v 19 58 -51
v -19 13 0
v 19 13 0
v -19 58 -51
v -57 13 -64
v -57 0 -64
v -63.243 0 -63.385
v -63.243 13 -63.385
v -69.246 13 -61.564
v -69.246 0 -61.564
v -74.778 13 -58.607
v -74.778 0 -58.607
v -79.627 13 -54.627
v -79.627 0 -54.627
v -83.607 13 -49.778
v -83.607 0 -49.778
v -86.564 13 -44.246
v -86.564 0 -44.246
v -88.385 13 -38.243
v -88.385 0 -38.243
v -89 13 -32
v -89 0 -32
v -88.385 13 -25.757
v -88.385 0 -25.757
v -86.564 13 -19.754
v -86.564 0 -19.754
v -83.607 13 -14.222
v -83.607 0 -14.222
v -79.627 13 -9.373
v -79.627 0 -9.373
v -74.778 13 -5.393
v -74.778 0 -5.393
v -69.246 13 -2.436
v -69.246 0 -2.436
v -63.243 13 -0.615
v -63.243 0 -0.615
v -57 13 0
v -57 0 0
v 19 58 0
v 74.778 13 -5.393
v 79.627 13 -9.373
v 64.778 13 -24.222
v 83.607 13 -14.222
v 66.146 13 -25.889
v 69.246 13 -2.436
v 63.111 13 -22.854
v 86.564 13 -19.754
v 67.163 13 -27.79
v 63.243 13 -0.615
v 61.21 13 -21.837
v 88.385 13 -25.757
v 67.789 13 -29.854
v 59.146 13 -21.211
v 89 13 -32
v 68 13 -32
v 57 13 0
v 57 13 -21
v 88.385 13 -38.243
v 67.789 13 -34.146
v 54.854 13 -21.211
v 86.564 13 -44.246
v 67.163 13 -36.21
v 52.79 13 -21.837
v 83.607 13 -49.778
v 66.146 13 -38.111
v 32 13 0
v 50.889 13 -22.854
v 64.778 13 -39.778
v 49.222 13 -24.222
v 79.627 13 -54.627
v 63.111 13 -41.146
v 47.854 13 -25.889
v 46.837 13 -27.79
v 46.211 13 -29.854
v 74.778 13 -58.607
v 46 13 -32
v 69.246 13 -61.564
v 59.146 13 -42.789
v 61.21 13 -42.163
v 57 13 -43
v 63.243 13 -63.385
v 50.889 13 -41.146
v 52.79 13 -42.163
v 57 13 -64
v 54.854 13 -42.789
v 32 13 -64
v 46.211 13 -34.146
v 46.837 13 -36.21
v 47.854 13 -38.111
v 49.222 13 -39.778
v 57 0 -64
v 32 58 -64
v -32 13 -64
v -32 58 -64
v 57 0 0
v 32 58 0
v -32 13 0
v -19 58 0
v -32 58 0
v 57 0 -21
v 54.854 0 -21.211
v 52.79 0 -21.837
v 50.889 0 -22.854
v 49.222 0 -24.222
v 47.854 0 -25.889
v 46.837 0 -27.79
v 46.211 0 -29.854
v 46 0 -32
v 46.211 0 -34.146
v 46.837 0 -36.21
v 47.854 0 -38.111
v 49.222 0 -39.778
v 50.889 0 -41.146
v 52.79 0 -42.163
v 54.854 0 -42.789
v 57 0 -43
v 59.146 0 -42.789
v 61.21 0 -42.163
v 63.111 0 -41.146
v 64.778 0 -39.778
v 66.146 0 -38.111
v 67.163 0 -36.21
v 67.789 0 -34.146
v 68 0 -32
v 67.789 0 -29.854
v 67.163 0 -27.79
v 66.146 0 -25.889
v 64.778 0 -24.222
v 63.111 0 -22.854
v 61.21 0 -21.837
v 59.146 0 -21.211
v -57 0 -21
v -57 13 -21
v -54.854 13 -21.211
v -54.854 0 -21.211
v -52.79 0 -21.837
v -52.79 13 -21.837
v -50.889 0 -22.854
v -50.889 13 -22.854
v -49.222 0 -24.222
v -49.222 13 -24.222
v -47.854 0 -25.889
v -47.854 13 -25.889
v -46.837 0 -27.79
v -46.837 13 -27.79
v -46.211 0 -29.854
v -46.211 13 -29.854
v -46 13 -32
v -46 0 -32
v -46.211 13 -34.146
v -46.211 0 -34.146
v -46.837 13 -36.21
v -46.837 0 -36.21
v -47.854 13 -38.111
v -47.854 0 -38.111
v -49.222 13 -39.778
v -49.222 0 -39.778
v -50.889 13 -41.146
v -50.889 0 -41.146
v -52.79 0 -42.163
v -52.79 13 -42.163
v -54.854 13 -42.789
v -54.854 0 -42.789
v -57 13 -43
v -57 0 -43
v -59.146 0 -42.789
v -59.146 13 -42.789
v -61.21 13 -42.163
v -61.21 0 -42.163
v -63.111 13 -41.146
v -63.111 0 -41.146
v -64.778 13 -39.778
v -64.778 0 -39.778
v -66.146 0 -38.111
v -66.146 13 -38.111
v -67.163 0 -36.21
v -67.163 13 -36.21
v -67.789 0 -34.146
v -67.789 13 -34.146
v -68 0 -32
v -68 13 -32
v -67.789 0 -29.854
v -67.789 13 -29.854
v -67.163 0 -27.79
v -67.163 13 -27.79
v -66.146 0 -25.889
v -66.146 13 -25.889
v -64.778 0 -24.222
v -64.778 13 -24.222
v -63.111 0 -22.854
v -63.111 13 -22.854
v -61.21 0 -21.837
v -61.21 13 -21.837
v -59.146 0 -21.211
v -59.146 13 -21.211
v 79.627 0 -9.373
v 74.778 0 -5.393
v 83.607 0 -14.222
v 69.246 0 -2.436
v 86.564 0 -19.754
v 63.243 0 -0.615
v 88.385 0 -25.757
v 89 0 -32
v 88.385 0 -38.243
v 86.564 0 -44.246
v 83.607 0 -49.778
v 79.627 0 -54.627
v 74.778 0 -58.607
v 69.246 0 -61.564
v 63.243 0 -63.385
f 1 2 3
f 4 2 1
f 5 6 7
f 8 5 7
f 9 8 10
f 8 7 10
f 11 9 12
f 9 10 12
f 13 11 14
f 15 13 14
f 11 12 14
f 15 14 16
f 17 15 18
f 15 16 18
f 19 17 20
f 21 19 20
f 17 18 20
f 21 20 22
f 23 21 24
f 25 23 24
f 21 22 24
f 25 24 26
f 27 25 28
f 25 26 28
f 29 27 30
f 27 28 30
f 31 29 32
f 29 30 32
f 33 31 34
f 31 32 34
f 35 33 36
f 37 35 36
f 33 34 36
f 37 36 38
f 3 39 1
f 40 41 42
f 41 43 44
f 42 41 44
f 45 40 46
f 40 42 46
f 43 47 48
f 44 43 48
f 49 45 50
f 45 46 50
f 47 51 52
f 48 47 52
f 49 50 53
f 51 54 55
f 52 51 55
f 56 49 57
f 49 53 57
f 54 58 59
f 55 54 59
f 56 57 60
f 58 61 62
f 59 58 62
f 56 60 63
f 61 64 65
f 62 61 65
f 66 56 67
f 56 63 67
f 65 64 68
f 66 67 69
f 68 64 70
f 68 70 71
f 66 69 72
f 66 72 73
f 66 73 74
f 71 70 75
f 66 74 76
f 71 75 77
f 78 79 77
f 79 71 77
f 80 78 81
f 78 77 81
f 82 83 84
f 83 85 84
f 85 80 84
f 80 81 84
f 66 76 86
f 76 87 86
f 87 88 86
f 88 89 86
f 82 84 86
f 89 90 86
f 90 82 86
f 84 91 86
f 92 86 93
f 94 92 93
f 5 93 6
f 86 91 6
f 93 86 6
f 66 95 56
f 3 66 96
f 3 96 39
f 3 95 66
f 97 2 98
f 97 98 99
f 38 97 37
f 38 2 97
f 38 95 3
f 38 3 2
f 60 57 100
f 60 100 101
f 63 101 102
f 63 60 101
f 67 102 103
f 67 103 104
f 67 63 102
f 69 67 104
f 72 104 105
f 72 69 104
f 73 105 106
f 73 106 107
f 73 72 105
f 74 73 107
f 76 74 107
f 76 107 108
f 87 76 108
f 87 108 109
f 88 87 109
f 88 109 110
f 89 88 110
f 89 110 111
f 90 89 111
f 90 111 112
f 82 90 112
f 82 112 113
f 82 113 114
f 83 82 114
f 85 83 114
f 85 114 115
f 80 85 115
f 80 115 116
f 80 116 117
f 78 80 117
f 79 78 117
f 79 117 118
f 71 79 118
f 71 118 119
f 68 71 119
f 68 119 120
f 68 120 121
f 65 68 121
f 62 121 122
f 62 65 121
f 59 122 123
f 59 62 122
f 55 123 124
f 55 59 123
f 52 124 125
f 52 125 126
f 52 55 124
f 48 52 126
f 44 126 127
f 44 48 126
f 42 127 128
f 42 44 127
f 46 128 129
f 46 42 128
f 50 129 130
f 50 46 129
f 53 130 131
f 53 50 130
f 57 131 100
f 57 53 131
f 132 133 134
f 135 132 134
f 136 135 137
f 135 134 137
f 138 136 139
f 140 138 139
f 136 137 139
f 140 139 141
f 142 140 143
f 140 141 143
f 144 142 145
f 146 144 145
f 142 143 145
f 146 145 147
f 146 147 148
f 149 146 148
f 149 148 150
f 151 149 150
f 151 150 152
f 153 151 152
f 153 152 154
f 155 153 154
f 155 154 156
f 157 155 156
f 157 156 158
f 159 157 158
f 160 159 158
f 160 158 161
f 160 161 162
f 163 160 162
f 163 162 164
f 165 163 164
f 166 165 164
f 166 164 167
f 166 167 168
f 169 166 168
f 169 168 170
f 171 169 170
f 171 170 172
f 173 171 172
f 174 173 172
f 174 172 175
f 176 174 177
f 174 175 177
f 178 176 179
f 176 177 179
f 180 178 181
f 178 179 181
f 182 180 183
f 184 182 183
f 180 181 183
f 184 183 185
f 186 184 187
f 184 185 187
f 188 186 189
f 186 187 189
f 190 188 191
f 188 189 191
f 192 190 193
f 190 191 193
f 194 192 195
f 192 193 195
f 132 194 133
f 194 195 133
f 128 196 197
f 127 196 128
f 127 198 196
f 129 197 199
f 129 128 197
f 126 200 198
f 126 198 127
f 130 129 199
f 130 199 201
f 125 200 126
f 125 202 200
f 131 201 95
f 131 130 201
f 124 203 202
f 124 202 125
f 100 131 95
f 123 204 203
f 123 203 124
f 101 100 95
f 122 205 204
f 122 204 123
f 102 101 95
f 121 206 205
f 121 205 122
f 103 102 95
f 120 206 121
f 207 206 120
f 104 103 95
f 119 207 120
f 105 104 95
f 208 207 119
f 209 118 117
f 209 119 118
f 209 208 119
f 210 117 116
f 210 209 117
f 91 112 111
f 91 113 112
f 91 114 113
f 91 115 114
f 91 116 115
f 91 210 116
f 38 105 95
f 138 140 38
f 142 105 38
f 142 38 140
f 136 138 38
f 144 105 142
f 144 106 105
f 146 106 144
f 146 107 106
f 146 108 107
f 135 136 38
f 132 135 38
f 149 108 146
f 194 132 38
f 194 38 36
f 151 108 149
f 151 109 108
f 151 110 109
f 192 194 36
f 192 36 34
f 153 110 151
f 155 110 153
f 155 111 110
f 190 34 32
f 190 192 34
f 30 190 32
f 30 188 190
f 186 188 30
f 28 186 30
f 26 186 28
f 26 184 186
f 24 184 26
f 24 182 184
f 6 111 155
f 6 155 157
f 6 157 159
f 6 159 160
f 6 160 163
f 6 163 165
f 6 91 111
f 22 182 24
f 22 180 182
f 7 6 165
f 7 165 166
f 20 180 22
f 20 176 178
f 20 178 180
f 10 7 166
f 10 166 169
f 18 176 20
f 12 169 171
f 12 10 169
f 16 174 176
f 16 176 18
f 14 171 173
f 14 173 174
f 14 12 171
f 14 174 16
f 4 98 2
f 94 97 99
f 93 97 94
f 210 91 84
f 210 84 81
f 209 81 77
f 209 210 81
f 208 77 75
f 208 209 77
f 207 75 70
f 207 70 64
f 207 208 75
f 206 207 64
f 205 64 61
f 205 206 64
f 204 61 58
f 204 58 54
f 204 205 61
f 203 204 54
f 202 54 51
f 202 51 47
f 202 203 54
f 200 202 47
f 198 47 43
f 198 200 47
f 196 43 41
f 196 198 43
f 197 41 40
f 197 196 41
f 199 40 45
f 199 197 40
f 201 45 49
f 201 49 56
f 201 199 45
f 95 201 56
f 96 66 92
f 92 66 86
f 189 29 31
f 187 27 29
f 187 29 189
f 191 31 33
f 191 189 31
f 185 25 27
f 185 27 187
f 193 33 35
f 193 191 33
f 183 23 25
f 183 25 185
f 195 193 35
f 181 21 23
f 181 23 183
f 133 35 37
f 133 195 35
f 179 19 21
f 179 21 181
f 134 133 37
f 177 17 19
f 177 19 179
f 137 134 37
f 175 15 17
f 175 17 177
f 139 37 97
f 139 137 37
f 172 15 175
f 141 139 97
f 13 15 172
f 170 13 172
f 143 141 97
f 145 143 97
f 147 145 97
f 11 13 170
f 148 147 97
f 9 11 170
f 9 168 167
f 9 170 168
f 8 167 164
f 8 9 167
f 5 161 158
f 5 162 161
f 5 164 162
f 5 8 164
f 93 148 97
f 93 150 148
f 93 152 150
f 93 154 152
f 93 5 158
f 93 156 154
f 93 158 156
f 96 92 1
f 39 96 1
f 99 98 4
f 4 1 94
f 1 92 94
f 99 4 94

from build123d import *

# Parameters (mm, degrees)
BOSS_EXTRUDE1_DEPTH = 13
SKETCH2_R           = 11
CUT_EXTRUDE1_DEPTH  = 111.390216958
SKETCH3_W           = 32
SKETCH3_H           = 64
BOSS_EXTRUDE2_DEPTH = 45
CUT_EXTRUDE2_DEPTH  = 19


with BuildPart() as part:
    # Sketch1 → Boss-Extrude1 (new body)
    with BuildSketch(Plane(origin=(0, 0, 0), x_dir=(1, 0, 0), z_dir=(0, 1, 0))):
        with BuildLine():
            Line((-57, 0), (0, 0))
            Line((0, 0), (0, 64))
            Line((0, 64), (-57, 64))
            ThreePointArc((-57, 64), (-89, 32), (-57, 0))
        make_face()
    boss_extrude1 = extrude(amount=BOSS_EXTRUDE1_DEPTH)

    # Sketch2 → Cut-Extrude1 (cut, through all)
    with BuildSketch(Plane(origin=(0, 13, 0), x_dir=(1, 0, 0), z_dir=(0, 1, 0))):
        with Locations((-57, 32)):
            Circle(SKETCH2_R)
    cut_extrude1 = extrude(amount=-CUT_EXTRUDE1_DEPTH, mode=Mode.SUBTRACT)

    # Sketch3 → Boss-Extrude2 (add)
    with BuildSketch(Plane(origin=(0, 13, 0), x_dir=(1, 0, 0), z_dir=(0, 1, 0))):
        with Locations((-16, 32)):
            Rectangle(SKETCH3_W, SKETCH3_H)
    boss_extrude2 = extrude(amount=BOSS_EXTRUDE2_DEPTH)

    # Sketch4 → Cut-Extrude2 (cut)
    with BuildSketch(Plane(origin=(0, 0, 0), x_dir=(0, 0, -1), z_dir=(1, 0, 0))):
        Polygon((0, 13), (51, 58), (0, 58), align=None)
    cut_extrude2 = extrude(amount=-CUT_EXTRUDE2_DEPTH, mode=Mode.SUBTRACT)

    # Mirror1: Boss-Extrude1, Cut-Extrude1, Boss-Extrude2, Cut-Extrude2 across plane
    add(boss_extrude1.mirror(Plane(origin=(0, 0, 0), x_dir=(0, 0, 1), z_dir=(1, 0, 0))))
    add(cut_extrude1.mirror(Plane(origin=(0, 0, 0), x_dir=(0, 0, 1), z_dir=(1, 0, 0))), mode=Mode.SUBTRACT)
    add(boss_extrude2.mirror(Plane(origin=(0, 0, 0), x_dir=(0, 0, 1), z_dir=(1, 0, 0))))
    add(cut_extrude2.mirror(Plane(origin=(0, 0, 0), x_dir=(0, 0, 1), z_dir=(1, 0, 0))), mode=Mode.SUBTRACT)


solid = part.part
